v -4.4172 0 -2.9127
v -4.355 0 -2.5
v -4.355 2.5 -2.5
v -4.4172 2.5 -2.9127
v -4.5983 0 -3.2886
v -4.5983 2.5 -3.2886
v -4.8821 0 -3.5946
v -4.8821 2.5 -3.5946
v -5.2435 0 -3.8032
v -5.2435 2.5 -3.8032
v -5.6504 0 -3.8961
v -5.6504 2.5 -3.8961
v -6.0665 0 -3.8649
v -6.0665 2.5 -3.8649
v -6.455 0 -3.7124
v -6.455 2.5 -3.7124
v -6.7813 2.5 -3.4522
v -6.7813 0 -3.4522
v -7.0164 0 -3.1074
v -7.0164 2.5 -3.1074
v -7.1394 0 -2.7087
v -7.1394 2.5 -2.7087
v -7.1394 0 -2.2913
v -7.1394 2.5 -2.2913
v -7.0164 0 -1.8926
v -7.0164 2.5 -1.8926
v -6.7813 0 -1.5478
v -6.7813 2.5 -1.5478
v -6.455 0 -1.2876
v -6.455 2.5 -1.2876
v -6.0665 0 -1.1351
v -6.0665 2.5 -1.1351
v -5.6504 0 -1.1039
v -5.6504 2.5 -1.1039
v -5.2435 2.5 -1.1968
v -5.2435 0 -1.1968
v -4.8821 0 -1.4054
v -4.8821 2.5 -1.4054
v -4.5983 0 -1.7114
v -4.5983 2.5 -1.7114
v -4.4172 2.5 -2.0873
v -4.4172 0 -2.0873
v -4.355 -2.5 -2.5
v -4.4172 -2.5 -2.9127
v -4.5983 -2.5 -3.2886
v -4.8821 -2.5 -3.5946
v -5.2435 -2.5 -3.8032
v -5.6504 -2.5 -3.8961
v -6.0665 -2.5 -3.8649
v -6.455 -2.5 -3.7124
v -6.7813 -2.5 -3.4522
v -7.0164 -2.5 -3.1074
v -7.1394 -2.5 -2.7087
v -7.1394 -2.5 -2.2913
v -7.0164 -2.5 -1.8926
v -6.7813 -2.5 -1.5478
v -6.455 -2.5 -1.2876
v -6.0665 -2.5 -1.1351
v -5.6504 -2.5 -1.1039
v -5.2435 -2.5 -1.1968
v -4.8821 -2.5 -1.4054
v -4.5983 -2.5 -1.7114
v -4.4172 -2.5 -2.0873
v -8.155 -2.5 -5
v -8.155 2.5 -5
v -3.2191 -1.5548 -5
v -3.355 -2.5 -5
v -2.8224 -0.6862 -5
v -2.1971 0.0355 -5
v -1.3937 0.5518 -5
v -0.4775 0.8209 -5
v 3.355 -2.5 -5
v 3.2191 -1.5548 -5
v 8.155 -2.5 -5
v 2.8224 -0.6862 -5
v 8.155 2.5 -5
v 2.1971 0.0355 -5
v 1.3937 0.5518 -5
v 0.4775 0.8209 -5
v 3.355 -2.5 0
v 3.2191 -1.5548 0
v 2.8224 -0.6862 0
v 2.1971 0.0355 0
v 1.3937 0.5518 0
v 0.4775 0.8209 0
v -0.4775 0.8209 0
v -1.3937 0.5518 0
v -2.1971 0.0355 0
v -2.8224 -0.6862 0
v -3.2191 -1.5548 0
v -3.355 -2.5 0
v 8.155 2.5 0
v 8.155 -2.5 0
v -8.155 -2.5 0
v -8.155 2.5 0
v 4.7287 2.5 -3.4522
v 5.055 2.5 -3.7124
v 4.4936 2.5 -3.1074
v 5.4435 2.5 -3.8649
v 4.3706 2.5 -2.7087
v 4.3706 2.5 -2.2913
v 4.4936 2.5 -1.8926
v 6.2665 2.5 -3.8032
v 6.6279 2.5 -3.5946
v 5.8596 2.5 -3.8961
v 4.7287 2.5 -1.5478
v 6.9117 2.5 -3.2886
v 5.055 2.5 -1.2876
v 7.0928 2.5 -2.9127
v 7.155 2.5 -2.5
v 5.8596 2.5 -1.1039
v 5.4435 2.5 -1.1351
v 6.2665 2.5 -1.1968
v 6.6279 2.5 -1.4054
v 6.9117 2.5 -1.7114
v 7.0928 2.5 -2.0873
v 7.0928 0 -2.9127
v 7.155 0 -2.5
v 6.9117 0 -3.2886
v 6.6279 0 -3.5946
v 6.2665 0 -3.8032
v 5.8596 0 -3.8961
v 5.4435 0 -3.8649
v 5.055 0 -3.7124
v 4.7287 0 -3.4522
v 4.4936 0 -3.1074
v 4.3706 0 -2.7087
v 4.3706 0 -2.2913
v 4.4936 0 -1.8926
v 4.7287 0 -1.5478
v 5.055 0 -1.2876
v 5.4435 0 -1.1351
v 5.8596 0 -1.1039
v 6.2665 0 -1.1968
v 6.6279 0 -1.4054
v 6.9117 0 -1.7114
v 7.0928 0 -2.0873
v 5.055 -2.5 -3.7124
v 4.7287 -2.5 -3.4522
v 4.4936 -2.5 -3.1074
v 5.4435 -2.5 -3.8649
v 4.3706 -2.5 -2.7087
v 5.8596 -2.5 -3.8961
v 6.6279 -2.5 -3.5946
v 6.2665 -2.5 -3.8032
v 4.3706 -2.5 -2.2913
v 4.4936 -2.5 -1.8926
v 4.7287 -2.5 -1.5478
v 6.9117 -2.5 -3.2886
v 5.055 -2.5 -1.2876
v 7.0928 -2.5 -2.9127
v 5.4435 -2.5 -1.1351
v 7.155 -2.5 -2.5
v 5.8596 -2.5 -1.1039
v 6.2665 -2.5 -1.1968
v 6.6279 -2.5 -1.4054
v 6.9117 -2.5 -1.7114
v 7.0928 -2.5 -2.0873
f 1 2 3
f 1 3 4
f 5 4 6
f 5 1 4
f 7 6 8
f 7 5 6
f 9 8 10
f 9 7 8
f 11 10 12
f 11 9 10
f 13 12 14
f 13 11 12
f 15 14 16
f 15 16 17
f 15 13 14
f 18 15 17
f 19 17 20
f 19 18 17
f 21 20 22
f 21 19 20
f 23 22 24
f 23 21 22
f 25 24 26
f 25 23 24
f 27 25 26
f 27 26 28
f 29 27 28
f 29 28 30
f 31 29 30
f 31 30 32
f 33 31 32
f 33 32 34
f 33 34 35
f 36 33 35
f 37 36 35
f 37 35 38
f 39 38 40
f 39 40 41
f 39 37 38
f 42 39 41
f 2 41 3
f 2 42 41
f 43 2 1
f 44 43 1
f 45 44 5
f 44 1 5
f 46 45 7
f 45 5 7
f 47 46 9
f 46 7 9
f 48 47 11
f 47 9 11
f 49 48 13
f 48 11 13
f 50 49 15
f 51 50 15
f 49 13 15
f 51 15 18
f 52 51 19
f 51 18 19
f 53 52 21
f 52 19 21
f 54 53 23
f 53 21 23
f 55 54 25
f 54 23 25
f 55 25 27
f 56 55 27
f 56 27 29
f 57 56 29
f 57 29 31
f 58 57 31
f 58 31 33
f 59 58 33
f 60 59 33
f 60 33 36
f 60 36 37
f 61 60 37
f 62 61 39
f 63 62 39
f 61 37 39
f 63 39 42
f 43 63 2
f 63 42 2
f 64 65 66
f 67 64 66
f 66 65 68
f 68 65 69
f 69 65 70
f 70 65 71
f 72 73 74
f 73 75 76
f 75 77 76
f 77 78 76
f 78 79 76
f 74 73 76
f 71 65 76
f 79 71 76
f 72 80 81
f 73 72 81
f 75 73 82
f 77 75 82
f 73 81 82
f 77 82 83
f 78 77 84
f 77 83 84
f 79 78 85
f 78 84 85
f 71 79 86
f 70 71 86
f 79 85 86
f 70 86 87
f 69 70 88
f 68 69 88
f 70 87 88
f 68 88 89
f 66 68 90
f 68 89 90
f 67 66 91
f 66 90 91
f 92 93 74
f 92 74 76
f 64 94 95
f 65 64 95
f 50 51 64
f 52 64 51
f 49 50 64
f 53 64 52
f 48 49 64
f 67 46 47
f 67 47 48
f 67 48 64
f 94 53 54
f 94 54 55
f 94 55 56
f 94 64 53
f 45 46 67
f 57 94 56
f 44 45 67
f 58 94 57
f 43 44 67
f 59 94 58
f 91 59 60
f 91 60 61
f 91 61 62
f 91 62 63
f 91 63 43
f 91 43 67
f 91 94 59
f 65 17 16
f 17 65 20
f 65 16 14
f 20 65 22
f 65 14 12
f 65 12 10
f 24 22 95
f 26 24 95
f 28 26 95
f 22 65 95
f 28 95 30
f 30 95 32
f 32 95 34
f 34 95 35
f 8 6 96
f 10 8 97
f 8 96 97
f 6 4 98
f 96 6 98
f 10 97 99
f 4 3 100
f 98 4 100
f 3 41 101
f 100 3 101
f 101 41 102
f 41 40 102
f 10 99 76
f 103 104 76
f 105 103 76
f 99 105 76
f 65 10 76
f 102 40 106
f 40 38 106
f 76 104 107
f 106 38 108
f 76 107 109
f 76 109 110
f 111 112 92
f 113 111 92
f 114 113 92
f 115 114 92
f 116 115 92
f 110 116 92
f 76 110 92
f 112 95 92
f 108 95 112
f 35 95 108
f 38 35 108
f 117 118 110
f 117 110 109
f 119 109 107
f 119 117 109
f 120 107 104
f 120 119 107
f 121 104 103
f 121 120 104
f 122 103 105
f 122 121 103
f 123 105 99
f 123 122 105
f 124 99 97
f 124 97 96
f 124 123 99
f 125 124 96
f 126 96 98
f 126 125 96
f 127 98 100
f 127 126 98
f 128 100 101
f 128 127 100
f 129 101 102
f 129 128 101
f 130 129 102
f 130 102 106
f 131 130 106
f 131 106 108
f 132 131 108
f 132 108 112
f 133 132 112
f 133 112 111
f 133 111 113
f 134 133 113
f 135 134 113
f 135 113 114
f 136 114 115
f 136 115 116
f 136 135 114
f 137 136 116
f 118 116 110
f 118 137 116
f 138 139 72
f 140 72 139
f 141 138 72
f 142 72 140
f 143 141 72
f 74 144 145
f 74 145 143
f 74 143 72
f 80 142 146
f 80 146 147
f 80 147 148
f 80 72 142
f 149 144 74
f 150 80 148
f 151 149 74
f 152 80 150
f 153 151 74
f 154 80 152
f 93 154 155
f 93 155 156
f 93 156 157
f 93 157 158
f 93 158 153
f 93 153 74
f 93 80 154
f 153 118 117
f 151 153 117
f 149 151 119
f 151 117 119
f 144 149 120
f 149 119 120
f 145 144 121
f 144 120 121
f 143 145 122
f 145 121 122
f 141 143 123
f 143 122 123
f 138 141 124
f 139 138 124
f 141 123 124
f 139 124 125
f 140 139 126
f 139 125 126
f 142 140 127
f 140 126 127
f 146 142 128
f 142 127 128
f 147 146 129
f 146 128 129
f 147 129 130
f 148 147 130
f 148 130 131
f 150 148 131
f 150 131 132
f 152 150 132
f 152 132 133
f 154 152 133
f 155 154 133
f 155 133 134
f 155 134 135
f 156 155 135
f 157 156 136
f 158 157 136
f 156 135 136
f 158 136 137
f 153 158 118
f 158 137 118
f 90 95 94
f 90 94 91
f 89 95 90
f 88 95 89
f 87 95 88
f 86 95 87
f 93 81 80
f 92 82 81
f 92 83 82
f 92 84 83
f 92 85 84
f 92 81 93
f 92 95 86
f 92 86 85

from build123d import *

# Parameters (mm, degrees)
SKETCH1_W                = 16.31
SKETCH1_H                = 5
BOSS_EXTRUDE3_DEPTH      = 5
CUT_EXTRUDE9_DEPTH       = 5
CUT_EXTRUDE10_DEPTH      = 2.5
CUT_EXTRUDE10_DEPTH_BACK = 2.5
SKETCH4_R                = 1.4


with BuildPart() as part:
    # Sketch1 → Boss-Extrude3 (new body)
    with BuildSketch(Plane.XY):
        Rectangle(SKETCH1_W, SKETCH1_H)
    extrude(amount=-BOSS_EXTRUDE3_DEPTH)

    # Sketch3 → Cut-Extrude9 (cut)
    with BuildSketch(Plane.XY):
        with BuildLine():
            Line((-3.355, -2.5), (3.355, -2.5))
            ThreePointArc((3.355, -2.5), (0, 0.855), (-3.355, -2.5))
        make_face()
    extrude(amount=-CUT_EXTRUDE9_DEPTH, mode=Mode.SUBTRACT)

    # Sketch4 → Cut-Extrude10 (cut, two sides: drawn at the far end of the back side and taken through both)
    with BuildSketch(Plane(origin=(0, 0, 0), x_dir=(1, 0, 0), z_dir=(0, 1, 0)).offset(-CUT_EXTRUDE10_DEPTH_BACK)):
        with Locations((-5.755, 2.5)):
            Circle(SKETCH4_R)
        with Locations((5.755, 2.5)):
            Circle(SKETCH4_R)
    extrude(amount=CUT_EXTRUDE10_DEPTH + CUT_EXTRUDE10_DEPTH_BACK, mode=Mode.SUBTRACT)


solid = part.part
